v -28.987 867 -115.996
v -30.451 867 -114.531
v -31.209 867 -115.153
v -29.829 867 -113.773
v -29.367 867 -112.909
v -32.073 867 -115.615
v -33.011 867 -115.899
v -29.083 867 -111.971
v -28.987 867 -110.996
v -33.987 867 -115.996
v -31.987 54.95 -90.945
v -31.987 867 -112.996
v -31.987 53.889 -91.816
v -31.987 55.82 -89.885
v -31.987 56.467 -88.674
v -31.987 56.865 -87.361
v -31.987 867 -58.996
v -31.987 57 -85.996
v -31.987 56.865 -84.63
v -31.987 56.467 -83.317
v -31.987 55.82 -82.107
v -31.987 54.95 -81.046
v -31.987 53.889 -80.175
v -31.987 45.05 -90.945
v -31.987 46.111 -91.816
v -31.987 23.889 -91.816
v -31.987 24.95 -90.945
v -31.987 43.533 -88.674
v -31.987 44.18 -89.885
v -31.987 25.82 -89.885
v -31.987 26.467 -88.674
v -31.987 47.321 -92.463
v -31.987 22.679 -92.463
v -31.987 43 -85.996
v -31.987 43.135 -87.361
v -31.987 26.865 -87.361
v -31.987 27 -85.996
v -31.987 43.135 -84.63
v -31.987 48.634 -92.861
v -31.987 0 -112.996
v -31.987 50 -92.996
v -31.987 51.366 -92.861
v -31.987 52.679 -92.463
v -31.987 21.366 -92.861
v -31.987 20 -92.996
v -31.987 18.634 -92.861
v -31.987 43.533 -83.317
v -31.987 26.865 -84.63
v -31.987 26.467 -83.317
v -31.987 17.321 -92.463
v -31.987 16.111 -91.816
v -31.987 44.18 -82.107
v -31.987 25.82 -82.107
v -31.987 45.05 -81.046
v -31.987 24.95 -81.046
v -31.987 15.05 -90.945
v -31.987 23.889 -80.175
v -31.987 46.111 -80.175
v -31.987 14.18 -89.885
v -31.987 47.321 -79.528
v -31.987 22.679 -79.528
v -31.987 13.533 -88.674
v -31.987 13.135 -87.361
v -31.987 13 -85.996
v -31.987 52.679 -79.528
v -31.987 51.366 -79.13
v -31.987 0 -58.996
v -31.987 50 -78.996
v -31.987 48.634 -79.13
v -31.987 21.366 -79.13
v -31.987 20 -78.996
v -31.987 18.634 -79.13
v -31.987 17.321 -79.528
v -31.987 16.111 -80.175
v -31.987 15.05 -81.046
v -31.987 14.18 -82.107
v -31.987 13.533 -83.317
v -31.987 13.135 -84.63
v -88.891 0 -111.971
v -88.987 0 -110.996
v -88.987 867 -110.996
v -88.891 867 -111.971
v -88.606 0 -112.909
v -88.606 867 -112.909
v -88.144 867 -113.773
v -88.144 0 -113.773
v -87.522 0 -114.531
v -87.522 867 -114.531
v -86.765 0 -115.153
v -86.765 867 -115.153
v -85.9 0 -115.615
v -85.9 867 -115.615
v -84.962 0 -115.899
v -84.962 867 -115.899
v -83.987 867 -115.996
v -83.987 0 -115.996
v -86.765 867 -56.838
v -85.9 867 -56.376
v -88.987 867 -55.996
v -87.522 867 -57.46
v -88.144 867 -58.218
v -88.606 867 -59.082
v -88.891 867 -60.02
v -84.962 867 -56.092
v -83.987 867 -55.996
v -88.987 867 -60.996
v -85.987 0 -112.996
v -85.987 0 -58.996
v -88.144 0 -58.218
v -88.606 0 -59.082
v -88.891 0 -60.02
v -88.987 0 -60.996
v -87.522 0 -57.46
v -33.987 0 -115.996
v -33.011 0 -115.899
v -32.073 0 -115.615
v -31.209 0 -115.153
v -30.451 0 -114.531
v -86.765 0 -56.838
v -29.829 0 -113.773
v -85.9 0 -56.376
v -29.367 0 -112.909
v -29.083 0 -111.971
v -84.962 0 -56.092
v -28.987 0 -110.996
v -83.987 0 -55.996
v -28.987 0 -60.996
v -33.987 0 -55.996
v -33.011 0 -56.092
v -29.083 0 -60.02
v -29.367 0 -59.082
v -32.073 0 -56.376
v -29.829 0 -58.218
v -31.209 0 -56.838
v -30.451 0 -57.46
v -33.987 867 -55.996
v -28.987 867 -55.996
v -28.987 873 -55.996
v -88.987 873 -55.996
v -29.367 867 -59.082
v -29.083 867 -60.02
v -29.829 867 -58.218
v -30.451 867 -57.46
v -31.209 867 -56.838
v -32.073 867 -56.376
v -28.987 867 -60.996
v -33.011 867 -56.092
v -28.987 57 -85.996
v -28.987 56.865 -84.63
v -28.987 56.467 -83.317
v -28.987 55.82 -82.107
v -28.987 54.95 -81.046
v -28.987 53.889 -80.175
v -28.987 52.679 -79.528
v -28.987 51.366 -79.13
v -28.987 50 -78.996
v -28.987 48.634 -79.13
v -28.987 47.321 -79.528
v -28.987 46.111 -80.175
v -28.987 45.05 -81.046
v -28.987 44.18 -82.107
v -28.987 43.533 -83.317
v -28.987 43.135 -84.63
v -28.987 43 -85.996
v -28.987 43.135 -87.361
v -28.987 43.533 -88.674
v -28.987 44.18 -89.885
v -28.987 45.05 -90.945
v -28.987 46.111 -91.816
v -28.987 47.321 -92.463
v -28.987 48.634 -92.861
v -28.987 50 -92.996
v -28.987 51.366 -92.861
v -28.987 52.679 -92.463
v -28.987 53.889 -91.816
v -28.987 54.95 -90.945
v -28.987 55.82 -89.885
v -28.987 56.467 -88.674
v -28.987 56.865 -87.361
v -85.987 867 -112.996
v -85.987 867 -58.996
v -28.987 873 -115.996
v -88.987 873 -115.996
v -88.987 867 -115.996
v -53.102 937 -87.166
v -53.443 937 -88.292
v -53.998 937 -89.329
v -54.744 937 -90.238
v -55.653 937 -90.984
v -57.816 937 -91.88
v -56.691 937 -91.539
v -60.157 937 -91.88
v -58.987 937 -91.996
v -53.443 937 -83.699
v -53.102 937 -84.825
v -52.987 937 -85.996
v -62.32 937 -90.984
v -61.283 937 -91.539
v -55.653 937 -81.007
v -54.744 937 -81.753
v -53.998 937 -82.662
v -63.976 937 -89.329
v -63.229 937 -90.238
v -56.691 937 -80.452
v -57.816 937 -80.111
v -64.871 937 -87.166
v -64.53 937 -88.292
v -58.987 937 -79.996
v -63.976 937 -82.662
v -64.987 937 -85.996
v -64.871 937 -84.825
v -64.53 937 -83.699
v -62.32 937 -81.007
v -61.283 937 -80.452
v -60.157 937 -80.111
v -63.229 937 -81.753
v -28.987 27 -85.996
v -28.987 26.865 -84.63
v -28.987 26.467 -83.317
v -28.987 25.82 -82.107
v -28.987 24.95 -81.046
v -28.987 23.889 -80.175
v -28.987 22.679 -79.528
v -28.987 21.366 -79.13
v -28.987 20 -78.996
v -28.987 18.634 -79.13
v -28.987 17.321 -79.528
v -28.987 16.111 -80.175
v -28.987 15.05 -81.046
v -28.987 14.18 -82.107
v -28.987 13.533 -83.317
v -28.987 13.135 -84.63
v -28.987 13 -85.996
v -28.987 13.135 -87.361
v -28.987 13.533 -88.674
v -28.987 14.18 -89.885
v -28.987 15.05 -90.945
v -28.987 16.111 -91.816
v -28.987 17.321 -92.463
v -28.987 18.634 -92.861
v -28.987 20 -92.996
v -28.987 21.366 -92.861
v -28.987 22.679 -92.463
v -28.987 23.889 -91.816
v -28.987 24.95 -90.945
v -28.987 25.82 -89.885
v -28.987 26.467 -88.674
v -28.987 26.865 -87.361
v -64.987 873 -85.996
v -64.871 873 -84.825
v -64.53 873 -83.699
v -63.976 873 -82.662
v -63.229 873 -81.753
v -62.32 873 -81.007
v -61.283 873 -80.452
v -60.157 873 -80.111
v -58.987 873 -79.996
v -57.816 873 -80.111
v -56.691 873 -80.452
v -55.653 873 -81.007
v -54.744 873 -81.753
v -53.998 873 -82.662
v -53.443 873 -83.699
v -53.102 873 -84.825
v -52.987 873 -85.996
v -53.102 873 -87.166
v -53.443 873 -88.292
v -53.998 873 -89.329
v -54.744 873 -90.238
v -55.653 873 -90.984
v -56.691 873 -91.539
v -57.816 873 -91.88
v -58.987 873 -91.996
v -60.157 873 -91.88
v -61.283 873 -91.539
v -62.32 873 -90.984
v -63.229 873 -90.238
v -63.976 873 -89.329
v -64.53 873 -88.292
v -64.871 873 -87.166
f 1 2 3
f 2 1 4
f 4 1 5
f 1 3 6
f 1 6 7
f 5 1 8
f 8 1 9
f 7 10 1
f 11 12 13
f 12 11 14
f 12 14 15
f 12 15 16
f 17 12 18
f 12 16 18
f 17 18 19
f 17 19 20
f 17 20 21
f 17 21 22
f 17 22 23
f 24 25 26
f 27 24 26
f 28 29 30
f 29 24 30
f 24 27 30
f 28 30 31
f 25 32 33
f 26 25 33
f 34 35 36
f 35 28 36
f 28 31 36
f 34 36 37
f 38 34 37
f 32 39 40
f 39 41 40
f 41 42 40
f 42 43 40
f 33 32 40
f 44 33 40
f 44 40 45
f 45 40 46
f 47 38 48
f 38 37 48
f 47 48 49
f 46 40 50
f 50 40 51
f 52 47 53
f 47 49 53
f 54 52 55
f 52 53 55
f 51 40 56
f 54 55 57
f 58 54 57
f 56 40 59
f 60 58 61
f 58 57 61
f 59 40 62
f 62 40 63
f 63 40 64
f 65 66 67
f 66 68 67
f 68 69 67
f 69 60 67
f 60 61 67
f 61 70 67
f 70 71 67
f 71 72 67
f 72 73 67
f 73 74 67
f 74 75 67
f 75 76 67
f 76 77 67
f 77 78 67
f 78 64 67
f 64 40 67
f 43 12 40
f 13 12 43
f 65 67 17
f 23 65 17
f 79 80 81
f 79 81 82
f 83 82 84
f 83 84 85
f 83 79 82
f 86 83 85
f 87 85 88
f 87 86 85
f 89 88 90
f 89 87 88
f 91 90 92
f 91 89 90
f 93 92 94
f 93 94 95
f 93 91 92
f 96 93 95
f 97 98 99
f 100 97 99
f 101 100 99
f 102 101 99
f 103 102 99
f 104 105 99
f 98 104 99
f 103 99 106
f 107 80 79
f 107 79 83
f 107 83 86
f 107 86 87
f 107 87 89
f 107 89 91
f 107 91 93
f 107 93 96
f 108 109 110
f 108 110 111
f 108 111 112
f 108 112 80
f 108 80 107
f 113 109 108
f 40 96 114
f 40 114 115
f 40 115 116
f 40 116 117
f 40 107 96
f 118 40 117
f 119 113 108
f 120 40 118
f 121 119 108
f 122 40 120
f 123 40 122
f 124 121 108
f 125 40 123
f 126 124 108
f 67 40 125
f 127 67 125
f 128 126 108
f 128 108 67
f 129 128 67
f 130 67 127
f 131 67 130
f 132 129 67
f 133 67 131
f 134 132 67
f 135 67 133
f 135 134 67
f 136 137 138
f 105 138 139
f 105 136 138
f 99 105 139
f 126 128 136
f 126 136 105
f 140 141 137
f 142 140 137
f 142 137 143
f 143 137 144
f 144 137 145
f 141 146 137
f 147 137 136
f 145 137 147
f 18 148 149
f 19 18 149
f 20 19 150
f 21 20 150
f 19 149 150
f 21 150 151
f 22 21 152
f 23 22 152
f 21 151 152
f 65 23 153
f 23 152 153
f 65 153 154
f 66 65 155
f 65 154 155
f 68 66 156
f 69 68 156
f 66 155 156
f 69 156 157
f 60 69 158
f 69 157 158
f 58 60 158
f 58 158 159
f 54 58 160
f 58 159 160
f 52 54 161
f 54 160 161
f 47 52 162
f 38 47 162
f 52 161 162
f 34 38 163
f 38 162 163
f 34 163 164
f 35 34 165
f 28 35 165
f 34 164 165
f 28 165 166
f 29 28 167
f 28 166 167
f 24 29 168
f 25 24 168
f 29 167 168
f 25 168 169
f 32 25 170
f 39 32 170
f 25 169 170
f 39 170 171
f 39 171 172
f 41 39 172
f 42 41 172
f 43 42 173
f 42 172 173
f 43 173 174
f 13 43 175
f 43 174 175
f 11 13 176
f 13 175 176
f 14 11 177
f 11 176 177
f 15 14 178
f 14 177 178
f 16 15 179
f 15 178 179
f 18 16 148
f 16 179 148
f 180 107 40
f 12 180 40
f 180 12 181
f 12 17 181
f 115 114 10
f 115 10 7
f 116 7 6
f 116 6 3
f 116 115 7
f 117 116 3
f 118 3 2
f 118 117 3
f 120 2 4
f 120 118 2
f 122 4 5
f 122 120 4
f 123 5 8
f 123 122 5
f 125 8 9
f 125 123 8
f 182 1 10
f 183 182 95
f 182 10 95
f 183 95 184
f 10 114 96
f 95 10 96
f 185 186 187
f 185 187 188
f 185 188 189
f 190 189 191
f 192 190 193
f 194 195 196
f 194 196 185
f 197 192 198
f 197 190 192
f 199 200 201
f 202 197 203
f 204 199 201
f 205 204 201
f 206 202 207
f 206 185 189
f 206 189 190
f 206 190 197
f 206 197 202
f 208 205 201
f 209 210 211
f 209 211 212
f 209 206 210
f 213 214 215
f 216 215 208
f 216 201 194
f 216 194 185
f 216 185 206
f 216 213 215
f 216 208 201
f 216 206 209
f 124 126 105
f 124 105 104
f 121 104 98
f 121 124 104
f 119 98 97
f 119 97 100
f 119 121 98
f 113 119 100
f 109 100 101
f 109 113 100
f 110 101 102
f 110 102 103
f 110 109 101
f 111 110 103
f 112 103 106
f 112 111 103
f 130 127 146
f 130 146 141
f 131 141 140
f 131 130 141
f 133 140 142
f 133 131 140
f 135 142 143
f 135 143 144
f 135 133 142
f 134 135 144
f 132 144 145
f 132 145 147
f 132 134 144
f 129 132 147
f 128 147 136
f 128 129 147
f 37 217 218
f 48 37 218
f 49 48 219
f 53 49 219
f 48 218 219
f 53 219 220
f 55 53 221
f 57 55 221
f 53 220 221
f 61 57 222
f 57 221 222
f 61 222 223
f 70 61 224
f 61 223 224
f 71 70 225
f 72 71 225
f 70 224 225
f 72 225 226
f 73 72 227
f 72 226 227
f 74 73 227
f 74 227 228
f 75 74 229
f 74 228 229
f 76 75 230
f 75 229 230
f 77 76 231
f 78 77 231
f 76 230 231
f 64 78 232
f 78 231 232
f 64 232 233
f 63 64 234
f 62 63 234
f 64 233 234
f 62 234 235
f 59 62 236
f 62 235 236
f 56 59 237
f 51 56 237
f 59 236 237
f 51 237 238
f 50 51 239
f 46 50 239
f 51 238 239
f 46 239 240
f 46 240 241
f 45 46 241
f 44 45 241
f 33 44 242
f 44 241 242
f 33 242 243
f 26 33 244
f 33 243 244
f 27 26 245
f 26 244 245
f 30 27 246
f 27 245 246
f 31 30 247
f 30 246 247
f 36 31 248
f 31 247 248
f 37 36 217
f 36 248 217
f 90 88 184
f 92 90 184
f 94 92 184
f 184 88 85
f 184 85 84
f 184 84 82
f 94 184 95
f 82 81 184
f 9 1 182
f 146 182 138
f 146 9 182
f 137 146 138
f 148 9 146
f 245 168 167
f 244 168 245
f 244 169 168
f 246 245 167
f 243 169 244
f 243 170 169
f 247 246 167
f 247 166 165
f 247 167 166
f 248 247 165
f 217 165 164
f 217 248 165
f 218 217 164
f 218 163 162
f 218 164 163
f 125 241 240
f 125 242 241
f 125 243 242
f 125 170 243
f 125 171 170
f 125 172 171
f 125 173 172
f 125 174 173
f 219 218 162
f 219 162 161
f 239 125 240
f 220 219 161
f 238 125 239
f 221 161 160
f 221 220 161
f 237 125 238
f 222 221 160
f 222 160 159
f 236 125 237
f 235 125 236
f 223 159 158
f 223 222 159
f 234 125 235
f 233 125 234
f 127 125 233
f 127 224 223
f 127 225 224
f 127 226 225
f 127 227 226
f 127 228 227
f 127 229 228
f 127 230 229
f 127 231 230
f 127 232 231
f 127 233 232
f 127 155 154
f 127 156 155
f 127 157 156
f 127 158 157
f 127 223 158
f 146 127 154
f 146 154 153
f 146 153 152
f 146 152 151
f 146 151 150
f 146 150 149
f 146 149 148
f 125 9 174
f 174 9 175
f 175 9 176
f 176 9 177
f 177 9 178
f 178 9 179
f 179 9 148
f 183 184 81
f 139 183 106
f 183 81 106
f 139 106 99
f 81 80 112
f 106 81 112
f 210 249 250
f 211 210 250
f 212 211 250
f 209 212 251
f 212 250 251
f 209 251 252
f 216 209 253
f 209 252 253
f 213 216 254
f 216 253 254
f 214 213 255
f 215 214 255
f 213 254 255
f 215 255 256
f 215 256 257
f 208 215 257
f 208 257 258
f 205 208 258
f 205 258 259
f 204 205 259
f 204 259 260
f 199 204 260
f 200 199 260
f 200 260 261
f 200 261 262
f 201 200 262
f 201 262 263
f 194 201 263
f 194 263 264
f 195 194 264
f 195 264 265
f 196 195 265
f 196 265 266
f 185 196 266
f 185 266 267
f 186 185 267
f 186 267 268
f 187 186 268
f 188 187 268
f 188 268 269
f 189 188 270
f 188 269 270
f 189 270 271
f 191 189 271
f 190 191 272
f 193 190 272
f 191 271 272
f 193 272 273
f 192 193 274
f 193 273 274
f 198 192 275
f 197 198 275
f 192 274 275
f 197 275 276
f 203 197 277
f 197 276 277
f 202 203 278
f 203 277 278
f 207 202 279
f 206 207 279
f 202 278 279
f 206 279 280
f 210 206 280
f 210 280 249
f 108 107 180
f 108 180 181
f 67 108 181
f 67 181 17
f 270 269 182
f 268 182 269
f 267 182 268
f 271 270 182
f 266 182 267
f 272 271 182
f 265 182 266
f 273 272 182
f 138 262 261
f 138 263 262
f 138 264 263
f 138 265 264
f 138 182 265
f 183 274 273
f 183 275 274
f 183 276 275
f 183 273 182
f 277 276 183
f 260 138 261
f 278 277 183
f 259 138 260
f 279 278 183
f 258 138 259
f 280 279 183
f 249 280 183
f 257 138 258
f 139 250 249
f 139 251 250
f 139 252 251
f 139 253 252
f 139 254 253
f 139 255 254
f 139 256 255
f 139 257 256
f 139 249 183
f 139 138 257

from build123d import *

# Parameters (mm, degrees)
F0_W     = 54
F0_H     = 54
F1_DEPTH = 867
F2_R     = 7
F3_DEPTH = 3
F4_W     = 60
F4_H     = 60
F4_R     = 6
F5_DEPTH = 6
F7_R     = 6
F8_DEPTH = 70


# Not quite as in the source:
# - a feature names something its author has since deleted; it is built from what else it names


with BuildPart() as f1:
    # F0 (on Front) → F1 (new body)
    with BuildSketch(Plane.XZ):
        with BuildLine():
            ThreePointArc((-28.9867345989, -60.995567819), (-30.4512006929, -57.460033913), (-33.9867345989, -55.995567819))
            Line((-33.9867345989, -55.995567819), (-83.9867345989, -55.995567819))
            ThreePointArc((-83.9867345989, -55.995567819), (-87.5222685048, -57.460033913), (-88.9867345989, -60.995567819))
            Line((-88.9867345989, -60.995567819), (-88.9867345989, -110.995567819))
            ThreePointArc((-88.9867345989, -110.995567819), (-87.5222685048, -114.5311017249), (-83.9867345989, -115.995567819))
            Line((-83.9867345989, -115.995567819), (-33.9867345989, -115.995567819))
            ThreePointArc((-33.9867345989, -115.995567819), (-30.4512006929, -114.5311017249), (-28.9867345989, -110.995567819))
            Line((-28.9867345989, -110.995567819), (-28.9867345989, -60.995567819))
        make_face()
        with Locations((-58.9867345989, -85.995567819)):
            Rectangle(F0_W, F0_H, mode=Mode.SUBTRACT)
    extrude(amount=-F1_DEPTH)

    # F2 (on face) → F3 (cut, through all)
    with BuildSketch(Plane.YZ.offset(-28.9867345989)):
        with Locations((20, -85.995567819)):
            Circle(F2_R)
        with Locations((50, -85.995567819)):
            Circle(F2_R)
    extrude(amount=-F3_DEPTH, mode=Mode.SUBTRACT)

    # F4 (on face) → F5 (join)
    with BuildSketch(Plane(origin=(0, 867, 0), x_dir=(-1, 0, 0), z_dir=(0, 1, 0))):
        with Locations((58.9867345989, -85.995567819)):
            Rectangle(F4_W, F4_H)
        with Locations((58.9867345989, -85.995567819)):
            Circle(F4_R, mode=Mode.SUBTRACT)
    extrude(amount=F5_DEPTH)

    # F7 (on offset) → F8 (join)
    with BuildSketch(Plane(origin=(0, 867, 0), x_dir=(-1, 0, 0), z_dir=(0, 1, 0))):
        with Locations((58.9867345989, -85.995567819)):
            Circle(F7_R)
    extrude(amount=F8_DEPTH)


solid = f1.part
